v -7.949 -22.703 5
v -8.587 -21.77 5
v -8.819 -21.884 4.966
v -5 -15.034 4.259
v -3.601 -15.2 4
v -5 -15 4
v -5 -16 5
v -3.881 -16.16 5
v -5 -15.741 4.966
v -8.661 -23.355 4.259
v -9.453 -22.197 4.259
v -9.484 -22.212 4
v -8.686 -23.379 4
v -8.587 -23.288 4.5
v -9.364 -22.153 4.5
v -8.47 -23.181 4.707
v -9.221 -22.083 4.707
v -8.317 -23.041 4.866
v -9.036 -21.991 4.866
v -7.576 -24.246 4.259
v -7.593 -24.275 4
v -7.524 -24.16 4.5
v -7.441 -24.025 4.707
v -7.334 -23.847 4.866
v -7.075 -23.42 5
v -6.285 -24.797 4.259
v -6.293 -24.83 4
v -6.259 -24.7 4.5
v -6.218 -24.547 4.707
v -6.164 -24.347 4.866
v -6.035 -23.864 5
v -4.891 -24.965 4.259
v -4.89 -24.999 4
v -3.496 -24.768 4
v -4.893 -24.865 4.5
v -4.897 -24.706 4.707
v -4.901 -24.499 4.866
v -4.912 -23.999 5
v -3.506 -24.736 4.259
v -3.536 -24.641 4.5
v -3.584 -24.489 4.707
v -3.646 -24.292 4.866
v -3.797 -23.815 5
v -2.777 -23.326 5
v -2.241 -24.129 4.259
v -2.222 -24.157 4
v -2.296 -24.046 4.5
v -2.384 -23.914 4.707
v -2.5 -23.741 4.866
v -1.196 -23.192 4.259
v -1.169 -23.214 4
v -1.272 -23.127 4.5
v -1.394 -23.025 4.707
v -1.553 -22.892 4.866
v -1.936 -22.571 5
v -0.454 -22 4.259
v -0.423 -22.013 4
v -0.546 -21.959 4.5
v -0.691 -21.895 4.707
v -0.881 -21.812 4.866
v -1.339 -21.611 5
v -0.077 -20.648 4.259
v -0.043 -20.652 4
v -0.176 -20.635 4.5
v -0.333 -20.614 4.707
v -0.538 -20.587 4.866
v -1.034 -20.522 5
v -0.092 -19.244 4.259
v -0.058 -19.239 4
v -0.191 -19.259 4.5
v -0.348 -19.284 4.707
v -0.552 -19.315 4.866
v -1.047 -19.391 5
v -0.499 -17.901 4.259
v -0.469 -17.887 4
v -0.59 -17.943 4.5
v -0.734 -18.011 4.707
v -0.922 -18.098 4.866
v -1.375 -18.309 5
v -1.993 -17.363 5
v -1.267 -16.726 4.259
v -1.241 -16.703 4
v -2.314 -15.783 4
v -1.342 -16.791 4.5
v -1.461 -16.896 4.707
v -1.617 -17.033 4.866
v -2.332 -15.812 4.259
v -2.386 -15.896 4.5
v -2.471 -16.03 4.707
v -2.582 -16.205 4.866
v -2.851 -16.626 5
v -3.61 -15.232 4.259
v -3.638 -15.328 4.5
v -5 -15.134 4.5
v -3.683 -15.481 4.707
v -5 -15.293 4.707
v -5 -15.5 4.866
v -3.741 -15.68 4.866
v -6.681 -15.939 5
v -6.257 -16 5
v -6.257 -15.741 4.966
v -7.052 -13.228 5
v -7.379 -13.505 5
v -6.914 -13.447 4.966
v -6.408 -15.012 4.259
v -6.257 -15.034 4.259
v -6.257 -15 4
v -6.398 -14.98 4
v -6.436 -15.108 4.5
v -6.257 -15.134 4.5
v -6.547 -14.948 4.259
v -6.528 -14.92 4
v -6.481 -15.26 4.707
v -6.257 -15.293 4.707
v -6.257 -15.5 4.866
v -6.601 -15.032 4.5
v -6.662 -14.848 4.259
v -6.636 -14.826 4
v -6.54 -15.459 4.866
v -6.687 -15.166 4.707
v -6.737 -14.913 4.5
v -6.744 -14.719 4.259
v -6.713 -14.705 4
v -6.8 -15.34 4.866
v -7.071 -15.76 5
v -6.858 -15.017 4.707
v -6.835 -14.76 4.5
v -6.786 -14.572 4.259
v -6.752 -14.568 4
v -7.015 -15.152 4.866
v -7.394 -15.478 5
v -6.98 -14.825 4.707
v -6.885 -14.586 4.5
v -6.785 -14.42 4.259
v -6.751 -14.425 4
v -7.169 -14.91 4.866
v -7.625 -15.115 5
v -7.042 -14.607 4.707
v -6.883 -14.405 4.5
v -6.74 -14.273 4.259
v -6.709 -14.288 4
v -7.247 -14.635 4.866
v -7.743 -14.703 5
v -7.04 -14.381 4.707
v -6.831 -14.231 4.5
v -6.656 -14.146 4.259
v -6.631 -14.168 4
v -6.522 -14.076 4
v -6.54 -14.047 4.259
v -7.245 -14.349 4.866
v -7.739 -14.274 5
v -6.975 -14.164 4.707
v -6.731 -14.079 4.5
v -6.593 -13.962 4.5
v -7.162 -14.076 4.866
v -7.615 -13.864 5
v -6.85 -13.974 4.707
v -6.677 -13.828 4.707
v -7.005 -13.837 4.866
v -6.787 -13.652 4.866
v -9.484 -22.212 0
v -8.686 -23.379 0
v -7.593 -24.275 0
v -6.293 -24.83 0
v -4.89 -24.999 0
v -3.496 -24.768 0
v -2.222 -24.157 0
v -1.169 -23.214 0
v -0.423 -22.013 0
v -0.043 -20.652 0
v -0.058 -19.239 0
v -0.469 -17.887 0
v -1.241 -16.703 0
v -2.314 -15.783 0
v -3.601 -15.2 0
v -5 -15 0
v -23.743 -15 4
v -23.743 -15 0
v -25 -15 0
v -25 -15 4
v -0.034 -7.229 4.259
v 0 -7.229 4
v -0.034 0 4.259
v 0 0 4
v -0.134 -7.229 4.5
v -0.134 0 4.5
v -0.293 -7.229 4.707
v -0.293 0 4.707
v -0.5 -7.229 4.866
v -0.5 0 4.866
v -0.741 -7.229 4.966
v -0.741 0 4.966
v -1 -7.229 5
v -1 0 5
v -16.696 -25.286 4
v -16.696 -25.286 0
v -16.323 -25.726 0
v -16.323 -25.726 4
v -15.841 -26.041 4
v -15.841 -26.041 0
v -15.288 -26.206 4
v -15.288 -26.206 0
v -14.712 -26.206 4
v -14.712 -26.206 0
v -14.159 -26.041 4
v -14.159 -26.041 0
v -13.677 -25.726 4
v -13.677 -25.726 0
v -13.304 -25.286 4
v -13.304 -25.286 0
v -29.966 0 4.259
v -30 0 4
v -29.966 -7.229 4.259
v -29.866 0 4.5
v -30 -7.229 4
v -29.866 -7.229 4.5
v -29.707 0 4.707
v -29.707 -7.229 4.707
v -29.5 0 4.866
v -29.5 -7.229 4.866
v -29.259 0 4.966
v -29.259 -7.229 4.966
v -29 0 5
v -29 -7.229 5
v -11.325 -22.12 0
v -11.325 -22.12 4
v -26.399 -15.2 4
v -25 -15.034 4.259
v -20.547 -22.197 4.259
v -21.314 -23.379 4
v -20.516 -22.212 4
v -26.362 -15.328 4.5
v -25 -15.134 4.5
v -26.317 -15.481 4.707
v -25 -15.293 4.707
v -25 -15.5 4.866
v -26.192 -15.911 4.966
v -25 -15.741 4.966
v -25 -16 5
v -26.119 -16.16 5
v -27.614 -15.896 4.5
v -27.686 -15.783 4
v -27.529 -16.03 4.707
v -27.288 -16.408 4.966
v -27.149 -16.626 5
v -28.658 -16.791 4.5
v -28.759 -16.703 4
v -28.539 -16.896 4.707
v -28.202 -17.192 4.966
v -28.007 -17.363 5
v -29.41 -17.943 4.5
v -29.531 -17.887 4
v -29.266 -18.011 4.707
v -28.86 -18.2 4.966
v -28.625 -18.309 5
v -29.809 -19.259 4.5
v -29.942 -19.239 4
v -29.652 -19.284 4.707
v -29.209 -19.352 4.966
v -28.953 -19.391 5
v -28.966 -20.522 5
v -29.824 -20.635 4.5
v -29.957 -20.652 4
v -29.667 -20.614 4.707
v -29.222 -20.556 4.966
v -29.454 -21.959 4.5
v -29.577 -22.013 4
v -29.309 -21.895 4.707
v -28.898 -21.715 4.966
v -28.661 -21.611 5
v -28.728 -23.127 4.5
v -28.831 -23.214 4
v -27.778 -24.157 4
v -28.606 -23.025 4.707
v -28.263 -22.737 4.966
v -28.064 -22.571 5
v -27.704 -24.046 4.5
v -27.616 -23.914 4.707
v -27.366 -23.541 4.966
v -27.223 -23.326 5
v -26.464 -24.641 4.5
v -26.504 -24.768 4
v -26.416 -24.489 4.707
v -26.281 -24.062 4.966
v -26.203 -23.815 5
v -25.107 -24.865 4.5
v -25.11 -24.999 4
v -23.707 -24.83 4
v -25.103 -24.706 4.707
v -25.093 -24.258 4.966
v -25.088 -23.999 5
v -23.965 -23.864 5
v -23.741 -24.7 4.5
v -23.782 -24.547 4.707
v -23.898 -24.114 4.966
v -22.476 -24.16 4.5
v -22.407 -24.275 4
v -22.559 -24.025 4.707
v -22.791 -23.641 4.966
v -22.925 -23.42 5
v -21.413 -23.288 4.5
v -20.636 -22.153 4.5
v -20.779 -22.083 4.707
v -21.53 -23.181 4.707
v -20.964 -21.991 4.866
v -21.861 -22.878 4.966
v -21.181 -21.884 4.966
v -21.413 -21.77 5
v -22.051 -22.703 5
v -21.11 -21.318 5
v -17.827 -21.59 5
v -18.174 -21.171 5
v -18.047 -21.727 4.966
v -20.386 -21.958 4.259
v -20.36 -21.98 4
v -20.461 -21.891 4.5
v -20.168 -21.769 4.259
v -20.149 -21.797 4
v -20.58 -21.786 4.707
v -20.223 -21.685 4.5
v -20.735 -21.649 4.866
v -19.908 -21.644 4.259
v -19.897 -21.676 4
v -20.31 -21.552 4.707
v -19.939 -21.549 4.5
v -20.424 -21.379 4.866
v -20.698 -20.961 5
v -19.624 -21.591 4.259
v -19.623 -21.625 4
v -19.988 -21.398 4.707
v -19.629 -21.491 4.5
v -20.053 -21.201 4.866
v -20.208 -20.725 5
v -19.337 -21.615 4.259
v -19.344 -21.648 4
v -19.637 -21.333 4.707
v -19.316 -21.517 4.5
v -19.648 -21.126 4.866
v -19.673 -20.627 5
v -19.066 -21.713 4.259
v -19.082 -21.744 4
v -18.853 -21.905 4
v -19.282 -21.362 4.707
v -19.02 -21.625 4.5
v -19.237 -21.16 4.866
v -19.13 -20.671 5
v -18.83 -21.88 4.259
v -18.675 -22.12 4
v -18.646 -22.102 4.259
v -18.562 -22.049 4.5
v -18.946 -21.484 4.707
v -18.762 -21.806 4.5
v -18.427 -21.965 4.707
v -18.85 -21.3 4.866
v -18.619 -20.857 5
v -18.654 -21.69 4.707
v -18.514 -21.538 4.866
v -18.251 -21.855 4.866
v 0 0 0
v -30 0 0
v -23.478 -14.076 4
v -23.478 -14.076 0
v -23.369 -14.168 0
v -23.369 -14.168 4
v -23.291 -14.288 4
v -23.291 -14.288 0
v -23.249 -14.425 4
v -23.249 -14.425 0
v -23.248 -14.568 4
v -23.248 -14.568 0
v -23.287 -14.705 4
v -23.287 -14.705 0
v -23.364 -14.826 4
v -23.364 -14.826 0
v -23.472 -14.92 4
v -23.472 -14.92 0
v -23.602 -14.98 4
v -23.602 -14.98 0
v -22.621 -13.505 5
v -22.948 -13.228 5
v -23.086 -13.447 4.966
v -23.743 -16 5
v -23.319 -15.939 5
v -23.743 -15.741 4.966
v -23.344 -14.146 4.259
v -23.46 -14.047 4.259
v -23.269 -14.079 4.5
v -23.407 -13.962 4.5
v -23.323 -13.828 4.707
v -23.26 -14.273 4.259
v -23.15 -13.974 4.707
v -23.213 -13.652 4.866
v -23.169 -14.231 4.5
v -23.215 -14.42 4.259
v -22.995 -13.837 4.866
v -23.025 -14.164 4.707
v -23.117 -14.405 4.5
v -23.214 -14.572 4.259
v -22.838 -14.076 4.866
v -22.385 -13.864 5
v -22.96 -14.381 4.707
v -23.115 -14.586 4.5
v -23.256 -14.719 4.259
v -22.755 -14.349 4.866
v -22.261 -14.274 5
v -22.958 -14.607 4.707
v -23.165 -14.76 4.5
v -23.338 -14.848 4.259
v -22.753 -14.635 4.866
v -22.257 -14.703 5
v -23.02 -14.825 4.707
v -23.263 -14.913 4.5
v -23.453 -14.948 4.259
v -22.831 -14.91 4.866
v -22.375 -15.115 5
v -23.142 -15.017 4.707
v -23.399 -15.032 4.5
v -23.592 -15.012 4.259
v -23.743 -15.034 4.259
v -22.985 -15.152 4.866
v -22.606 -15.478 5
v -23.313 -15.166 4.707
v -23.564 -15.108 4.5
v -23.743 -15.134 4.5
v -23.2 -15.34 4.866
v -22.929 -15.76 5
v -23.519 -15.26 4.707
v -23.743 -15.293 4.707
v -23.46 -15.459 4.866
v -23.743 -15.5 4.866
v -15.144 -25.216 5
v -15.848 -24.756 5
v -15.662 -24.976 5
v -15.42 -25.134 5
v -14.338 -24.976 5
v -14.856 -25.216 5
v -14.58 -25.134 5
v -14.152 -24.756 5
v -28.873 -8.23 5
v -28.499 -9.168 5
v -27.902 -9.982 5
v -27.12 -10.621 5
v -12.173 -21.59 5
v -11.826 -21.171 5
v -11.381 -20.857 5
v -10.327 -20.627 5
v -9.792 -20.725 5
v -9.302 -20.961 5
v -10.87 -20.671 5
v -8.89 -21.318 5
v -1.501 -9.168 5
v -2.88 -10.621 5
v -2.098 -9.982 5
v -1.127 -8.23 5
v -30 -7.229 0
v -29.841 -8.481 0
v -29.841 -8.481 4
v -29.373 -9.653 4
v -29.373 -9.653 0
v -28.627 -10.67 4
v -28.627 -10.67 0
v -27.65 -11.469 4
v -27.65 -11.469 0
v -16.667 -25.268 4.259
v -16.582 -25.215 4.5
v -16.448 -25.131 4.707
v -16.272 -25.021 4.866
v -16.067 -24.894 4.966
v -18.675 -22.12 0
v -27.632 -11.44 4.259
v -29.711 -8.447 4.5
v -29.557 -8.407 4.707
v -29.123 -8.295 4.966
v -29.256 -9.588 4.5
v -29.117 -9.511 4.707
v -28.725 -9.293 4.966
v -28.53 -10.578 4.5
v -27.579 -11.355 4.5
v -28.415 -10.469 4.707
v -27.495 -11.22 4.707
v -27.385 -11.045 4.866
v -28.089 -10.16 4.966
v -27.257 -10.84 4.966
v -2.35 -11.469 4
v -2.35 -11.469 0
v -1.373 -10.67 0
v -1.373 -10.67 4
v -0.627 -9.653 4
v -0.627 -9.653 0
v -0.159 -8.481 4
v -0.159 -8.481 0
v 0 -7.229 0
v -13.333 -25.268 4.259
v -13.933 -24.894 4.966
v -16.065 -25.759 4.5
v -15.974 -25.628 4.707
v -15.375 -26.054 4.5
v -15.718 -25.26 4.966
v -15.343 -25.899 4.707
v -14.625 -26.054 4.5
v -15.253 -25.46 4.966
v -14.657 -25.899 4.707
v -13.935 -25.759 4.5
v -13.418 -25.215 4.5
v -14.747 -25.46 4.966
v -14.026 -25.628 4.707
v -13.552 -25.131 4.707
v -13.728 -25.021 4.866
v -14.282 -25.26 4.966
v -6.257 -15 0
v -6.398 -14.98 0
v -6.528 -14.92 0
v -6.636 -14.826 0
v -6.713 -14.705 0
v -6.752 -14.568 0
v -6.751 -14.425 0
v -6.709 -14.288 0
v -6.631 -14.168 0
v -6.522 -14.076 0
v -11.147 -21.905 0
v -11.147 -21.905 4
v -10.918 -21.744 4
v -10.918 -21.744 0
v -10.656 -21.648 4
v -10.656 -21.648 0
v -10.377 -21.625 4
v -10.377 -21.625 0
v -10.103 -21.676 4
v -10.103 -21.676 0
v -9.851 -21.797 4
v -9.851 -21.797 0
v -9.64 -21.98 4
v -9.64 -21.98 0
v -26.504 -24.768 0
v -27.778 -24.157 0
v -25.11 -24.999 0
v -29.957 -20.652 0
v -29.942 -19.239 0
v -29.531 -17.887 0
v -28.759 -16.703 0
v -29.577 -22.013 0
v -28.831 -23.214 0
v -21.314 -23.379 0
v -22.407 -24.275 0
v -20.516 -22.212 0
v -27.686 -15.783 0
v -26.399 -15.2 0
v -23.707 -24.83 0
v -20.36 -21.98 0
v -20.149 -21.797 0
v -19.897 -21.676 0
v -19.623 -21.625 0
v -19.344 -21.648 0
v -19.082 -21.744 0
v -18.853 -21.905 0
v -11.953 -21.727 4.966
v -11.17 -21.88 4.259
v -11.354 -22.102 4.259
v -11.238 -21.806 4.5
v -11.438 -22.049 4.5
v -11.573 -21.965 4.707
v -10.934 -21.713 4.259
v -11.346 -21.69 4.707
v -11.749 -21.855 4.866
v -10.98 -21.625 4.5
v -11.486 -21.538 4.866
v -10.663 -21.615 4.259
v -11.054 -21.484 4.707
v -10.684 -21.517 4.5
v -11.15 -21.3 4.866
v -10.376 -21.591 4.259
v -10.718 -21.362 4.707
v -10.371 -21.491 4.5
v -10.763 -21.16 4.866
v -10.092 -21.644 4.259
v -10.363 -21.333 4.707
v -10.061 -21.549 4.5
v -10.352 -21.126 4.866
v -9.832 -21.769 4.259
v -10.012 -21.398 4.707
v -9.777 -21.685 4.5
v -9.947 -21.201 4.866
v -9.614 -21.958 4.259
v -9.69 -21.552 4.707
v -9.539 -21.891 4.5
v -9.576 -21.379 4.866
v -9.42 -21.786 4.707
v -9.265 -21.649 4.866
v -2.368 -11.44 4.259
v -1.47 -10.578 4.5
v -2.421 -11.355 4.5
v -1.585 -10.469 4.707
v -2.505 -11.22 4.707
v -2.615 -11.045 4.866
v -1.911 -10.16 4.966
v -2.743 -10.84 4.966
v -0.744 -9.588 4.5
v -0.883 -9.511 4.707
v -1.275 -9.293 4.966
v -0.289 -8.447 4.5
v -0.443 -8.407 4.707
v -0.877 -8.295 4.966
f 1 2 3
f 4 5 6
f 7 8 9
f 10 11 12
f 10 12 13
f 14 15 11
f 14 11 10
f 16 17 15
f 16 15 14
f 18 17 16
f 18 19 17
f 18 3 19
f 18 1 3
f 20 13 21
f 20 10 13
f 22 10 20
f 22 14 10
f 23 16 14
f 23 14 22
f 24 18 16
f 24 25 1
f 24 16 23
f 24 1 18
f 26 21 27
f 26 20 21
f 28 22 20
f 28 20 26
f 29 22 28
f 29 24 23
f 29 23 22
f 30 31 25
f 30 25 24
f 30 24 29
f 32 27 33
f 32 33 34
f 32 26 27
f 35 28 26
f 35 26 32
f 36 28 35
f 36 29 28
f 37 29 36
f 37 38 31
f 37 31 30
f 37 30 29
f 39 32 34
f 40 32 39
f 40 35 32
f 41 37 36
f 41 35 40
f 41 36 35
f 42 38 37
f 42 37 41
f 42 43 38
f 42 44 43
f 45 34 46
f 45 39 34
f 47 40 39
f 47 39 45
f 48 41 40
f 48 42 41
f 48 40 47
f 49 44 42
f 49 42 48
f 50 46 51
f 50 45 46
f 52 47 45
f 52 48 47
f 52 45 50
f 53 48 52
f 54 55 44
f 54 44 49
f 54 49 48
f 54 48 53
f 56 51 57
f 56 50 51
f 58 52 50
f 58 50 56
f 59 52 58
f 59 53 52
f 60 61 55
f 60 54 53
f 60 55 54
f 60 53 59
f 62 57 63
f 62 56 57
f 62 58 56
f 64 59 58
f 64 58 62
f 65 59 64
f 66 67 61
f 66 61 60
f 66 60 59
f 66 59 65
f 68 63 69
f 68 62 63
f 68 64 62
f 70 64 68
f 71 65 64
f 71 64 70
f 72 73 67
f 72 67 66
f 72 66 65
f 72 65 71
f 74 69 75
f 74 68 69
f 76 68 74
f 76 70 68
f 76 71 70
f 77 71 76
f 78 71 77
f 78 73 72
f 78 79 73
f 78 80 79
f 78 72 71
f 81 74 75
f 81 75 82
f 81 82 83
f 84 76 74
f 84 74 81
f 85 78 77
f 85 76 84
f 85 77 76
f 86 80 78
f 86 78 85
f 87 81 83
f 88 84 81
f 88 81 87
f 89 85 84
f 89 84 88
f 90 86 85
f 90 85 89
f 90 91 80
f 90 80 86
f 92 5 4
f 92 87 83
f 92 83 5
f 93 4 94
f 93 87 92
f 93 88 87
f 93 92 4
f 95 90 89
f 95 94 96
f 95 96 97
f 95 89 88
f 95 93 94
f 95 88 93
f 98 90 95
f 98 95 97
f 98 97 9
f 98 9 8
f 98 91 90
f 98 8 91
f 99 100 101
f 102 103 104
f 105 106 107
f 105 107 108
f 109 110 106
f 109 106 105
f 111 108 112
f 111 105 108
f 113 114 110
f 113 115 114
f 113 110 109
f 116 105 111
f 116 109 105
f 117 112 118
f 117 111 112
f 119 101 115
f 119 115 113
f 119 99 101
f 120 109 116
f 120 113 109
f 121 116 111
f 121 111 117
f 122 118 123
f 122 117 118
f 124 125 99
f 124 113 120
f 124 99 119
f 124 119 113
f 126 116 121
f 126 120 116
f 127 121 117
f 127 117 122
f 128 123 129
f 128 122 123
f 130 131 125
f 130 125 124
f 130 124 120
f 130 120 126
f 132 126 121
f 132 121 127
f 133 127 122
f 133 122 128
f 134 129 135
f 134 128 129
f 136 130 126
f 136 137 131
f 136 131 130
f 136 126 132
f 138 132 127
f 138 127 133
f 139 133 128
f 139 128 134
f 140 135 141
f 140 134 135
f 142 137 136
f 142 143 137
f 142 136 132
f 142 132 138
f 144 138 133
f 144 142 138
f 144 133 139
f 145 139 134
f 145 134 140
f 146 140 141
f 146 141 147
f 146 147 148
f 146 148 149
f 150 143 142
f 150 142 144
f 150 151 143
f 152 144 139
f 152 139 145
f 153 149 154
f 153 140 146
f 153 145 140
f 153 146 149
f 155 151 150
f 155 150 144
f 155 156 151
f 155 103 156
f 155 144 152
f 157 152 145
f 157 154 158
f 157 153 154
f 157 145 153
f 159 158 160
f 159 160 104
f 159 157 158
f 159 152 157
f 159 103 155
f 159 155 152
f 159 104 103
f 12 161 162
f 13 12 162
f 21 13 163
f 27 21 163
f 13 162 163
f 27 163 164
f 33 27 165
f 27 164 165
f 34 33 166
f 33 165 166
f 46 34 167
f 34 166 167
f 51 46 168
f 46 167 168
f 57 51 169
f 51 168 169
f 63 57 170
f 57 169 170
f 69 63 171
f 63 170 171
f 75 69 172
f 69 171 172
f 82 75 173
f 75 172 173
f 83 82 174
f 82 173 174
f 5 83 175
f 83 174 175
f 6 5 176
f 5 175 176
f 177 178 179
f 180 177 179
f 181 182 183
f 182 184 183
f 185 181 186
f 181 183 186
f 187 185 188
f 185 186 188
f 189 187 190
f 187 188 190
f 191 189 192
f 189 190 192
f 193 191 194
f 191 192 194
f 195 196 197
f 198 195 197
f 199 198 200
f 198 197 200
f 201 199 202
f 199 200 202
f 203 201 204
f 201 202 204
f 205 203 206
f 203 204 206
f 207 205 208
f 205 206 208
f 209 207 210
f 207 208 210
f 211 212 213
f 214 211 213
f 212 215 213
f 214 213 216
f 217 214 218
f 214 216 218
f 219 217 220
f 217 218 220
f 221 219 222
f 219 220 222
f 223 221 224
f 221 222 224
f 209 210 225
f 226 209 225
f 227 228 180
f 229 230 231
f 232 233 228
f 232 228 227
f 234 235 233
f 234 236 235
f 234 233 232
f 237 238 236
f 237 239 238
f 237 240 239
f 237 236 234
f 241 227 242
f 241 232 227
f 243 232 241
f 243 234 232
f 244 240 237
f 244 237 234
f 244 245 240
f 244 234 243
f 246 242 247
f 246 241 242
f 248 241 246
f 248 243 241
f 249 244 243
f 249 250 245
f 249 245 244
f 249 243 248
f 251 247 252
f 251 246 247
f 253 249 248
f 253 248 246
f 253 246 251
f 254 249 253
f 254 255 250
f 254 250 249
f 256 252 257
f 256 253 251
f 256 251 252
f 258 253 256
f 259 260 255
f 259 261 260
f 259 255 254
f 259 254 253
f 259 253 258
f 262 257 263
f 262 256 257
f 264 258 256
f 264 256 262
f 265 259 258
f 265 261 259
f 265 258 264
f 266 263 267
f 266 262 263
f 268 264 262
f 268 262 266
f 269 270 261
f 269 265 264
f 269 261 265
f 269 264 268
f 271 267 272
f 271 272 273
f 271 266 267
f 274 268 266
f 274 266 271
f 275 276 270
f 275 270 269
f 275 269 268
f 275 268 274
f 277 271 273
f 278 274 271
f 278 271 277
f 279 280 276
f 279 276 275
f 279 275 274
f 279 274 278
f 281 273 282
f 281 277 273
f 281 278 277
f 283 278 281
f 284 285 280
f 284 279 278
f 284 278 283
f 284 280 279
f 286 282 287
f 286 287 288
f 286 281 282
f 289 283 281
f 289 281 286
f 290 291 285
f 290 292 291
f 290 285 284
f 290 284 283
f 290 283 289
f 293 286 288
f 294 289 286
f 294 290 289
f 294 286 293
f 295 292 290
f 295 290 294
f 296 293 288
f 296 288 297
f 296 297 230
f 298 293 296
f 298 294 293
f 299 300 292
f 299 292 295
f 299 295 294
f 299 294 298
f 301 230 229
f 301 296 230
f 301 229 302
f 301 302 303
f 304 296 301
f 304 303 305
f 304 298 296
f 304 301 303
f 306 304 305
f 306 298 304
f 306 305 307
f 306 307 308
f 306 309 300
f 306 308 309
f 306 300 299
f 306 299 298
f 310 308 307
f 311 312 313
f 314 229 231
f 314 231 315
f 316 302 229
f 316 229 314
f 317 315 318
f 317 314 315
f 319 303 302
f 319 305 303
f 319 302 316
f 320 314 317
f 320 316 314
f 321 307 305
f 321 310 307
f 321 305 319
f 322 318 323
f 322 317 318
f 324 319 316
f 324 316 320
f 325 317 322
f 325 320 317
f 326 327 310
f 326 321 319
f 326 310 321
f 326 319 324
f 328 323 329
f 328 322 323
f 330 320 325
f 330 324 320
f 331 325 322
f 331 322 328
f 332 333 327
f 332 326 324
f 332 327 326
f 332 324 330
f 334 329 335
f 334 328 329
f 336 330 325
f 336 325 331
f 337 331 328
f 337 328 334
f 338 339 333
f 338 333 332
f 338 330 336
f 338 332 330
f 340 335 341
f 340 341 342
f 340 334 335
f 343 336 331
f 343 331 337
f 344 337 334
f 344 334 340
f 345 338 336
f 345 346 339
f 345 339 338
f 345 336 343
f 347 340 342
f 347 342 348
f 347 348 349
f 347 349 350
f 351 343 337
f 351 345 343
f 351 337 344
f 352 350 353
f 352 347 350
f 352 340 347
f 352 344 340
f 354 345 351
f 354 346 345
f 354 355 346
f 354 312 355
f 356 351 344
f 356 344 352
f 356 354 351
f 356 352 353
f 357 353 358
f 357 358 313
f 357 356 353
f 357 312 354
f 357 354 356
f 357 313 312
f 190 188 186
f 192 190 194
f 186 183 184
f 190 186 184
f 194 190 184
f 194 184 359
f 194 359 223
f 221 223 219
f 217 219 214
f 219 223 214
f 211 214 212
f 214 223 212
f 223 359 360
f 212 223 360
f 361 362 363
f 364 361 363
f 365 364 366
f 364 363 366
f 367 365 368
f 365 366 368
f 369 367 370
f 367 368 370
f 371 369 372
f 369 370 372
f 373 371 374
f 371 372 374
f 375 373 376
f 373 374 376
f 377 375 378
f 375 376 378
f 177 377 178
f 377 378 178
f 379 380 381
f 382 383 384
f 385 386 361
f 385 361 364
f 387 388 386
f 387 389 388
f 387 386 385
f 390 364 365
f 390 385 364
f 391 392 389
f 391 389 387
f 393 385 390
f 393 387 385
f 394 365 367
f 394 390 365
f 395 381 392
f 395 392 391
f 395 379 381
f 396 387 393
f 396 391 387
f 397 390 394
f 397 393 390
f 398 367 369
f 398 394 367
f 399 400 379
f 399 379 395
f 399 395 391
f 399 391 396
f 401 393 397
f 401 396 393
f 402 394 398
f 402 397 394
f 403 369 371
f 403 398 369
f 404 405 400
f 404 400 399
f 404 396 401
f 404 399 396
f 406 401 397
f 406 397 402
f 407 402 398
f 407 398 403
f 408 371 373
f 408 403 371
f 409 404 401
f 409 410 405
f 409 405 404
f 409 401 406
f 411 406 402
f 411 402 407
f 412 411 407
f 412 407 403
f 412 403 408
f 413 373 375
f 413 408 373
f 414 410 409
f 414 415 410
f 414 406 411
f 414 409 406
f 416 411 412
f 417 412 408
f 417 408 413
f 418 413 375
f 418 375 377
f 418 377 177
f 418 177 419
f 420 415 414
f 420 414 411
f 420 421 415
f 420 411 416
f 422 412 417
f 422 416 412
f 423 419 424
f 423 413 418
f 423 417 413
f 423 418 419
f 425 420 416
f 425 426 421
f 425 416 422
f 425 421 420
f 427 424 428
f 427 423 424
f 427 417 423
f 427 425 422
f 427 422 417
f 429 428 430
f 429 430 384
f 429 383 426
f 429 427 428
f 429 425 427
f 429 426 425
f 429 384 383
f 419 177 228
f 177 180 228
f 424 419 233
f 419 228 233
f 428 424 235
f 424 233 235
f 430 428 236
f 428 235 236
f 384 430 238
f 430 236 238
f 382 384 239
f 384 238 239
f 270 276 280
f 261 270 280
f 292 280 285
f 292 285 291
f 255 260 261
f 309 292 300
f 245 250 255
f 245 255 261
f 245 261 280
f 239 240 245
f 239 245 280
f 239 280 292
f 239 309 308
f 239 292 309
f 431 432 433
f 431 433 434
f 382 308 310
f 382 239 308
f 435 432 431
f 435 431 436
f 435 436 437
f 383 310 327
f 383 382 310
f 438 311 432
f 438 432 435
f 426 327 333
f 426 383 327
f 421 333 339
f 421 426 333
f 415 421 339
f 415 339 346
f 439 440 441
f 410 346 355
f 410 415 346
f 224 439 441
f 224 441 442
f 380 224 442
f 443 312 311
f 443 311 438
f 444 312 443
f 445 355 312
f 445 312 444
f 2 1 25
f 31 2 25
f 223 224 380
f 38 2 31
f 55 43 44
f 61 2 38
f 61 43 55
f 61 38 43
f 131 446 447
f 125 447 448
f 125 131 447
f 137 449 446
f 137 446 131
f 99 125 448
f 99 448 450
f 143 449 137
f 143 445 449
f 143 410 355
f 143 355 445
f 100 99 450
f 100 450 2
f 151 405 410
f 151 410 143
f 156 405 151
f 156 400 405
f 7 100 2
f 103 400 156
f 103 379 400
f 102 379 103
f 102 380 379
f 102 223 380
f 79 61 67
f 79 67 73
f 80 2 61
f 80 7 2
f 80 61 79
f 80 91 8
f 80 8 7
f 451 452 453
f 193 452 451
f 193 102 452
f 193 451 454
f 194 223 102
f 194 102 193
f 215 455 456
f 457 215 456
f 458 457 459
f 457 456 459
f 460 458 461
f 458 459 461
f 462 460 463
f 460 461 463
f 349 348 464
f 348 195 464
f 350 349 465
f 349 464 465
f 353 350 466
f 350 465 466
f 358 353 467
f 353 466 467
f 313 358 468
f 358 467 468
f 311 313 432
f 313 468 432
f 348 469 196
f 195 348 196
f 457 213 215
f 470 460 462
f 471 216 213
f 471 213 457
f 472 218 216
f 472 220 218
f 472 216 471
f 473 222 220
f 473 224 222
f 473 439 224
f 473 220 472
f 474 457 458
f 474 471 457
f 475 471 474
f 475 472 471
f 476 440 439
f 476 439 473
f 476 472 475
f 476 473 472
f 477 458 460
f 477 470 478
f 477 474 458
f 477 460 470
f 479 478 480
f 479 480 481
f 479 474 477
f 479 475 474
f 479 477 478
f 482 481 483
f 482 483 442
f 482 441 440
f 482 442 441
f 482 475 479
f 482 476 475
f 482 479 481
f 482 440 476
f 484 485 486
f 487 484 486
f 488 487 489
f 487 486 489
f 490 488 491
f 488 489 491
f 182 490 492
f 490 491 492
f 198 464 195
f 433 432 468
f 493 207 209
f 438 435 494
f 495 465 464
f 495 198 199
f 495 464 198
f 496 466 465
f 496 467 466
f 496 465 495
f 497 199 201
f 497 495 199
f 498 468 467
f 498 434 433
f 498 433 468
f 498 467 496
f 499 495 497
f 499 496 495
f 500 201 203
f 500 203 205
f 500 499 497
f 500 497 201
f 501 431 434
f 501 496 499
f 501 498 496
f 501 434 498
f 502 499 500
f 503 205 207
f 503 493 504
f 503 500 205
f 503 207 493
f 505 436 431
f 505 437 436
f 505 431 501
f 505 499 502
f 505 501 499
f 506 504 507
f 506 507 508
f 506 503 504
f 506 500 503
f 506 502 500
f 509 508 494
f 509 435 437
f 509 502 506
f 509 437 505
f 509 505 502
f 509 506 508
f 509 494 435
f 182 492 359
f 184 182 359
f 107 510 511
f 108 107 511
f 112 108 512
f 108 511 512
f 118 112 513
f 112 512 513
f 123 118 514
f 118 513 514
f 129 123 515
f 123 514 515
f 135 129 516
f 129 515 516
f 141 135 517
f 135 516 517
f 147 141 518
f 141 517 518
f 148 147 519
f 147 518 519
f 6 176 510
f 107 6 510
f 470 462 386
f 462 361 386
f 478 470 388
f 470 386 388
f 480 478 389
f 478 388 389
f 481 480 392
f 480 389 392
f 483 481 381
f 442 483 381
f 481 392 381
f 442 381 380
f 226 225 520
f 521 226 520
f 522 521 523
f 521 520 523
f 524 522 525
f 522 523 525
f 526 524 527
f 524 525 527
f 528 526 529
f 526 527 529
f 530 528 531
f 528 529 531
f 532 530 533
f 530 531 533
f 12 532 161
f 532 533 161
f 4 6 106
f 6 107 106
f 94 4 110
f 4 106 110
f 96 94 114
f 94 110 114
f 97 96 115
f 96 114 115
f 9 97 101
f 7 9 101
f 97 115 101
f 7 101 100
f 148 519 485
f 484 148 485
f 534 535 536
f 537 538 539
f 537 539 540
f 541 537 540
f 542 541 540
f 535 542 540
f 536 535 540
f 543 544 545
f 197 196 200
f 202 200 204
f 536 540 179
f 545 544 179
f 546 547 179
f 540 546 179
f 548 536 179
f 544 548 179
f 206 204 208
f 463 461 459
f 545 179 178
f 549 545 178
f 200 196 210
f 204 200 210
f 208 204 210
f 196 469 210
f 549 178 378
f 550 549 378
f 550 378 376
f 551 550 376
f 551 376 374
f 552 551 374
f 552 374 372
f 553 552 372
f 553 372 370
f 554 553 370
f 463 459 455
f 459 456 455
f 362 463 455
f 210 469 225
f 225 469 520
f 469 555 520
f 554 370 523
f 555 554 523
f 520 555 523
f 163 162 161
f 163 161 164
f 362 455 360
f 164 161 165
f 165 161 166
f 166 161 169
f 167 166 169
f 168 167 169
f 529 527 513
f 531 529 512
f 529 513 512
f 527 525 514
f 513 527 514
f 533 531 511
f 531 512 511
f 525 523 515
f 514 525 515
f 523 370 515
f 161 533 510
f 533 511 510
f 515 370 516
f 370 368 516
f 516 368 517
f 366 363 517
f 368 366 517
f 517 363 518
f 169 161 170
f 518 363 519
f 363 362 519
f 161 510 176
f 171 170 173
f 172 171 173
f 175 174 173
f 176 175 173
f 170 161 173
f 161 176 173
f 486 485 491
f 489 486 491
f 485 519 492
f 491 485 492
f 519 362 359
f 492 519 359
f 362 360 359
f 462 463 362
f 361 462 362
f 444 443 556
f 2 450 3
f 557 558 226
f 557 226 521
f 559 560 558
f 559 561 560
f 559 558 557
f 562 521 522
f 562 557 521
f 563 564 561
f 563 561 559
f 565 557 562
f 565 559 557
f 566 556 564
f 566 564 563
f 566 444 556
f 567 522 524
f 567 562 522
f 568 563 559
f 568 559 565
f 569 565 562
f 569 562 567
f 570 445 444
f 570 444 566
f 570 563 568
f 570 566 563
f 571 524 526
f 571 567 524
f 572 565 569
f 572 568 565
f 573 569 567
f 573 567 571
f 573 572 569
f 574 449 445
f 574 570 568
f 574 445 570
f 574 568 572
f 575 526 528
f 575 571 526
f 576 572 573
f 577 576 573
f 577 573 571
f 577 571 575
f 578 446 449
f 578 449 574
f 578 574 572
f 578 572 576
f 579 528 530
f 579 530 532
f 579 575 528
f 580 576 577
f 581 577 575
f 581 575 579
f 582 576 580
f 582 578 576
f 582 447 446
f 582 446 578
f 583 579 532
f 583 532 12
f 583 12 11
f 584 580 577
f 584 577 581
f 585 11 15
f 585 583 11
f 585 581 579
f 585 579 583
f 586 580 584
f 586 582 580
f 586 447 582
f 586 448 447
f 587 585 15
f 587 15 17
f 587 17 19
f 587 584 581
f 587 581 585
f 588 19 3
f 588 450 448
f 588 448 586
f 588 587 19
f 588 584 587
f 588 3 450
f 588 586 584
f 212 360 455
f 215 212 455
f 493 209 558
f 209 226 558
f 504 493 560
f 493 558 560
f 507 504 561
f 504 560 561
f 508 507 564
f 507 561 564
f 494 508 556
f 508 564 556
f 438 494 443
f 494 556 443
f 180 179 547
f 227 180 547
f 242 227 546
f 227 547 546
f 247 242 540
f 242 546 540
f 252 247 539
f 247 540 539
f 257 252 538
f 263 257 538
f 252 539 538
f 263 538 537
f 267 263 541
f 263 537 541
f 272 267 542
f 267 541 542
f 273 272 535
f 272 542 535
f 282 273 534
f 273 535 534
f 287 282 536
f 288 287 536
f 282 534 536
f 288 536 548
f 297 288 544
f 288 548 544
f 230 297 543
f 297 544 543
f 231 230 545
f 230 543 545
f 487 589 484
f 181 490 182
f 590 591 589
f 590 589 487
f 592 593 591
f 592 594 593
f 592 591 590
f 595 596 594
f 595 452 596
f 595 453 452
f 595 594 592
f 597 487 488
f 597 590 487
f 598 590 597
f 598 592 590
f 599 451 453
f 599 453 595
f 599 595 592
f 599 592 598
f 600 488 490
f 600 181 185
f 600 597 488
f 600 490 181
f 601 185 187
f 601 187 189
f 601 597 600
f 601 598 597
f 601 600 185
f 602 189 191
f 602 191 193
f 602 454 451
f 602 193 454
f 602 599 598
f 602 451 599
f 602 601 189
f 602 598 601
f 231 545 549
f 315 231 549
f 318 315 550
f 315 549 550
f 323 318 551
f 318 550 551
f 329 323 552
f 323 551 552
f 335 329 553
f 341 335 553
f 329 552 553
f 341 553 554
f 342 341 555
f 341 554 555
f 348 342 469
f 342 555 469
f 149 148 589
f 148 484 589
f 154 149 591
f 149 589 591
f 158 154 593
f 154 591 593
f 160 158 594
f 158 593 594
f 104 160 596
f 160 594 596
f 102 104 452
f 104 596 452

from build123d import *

# Parameters (mm, degrees)
F1_DEPTH = 5
F2_R     = 1


with BuildPart() as f1:
    # F0 (on Top) → F1 (new body)
    with BuildSketch(Plane.XY):
        with BuildLine():
            ThreePointArc((-11.324876, -22.119801), (-10.3773, -21.625245), (-9.483998, -22.212185))
            ThreePointArc((-9.483998, -22.212185), (-0.753771, -22.639988), (-5, -15))
            Line((-5, -15), (-6.256602, -15))
            ThreePointArc((-6.256602, -15), (-6.737226, -14.637841), (-6.521601, -14.076001))
            Line((-6.521601, -14.076001), (-2.350005, -11.468753))
            ThreePointArc((-2.350005, -11.468753), (-0.626788, -9.652604), (0, -7.228762))
            Line((0, -7.228762), (0, 0))
            Line((0, 0), (-30, 0))
            Line((-30, 0), (-30, -7.228762))
            ThreePointArc((-30, -7.228762), (-29.373212, -9.652604), (-27.649995, -11.468753))
            Line((-27.649995, -11.468753), (-23.478399, -14.076001))
            ThreePointArc((-23.478399, -14.076001), (-23.262774, -14.637841), (-23.743398, -15))
            Line((-23.743398, -15), (-25, -15))
            ThreePointArc((-25, -15), (-29.246229, -22.639988), (-20.516002, -22.212185))
            ThreePointArc((-20.516002, -22.212185), (-19.6227, -21.625245), (-18.675124, -22.119801))
            Line((-18.675124, -22.119801), (-16.695997, -25.286405))
            ThreePointArc((-16.695997, -25.286405), (-15, -26.226408), (-13.304003, -25.286405))
            Line((-13.304003, -25.286405), (-11.324876, -22.119801))
        make_face()
    extrude(amount=F1_DEPTH)

    # F2
    f2_edges = [f1.edges().sort_by_distance(p)[0] for p in [
        (-29.246229, -22.639988, 5),
    ]]
    fillet(f2_edges, radius=F2_R)


solid = f1.part
